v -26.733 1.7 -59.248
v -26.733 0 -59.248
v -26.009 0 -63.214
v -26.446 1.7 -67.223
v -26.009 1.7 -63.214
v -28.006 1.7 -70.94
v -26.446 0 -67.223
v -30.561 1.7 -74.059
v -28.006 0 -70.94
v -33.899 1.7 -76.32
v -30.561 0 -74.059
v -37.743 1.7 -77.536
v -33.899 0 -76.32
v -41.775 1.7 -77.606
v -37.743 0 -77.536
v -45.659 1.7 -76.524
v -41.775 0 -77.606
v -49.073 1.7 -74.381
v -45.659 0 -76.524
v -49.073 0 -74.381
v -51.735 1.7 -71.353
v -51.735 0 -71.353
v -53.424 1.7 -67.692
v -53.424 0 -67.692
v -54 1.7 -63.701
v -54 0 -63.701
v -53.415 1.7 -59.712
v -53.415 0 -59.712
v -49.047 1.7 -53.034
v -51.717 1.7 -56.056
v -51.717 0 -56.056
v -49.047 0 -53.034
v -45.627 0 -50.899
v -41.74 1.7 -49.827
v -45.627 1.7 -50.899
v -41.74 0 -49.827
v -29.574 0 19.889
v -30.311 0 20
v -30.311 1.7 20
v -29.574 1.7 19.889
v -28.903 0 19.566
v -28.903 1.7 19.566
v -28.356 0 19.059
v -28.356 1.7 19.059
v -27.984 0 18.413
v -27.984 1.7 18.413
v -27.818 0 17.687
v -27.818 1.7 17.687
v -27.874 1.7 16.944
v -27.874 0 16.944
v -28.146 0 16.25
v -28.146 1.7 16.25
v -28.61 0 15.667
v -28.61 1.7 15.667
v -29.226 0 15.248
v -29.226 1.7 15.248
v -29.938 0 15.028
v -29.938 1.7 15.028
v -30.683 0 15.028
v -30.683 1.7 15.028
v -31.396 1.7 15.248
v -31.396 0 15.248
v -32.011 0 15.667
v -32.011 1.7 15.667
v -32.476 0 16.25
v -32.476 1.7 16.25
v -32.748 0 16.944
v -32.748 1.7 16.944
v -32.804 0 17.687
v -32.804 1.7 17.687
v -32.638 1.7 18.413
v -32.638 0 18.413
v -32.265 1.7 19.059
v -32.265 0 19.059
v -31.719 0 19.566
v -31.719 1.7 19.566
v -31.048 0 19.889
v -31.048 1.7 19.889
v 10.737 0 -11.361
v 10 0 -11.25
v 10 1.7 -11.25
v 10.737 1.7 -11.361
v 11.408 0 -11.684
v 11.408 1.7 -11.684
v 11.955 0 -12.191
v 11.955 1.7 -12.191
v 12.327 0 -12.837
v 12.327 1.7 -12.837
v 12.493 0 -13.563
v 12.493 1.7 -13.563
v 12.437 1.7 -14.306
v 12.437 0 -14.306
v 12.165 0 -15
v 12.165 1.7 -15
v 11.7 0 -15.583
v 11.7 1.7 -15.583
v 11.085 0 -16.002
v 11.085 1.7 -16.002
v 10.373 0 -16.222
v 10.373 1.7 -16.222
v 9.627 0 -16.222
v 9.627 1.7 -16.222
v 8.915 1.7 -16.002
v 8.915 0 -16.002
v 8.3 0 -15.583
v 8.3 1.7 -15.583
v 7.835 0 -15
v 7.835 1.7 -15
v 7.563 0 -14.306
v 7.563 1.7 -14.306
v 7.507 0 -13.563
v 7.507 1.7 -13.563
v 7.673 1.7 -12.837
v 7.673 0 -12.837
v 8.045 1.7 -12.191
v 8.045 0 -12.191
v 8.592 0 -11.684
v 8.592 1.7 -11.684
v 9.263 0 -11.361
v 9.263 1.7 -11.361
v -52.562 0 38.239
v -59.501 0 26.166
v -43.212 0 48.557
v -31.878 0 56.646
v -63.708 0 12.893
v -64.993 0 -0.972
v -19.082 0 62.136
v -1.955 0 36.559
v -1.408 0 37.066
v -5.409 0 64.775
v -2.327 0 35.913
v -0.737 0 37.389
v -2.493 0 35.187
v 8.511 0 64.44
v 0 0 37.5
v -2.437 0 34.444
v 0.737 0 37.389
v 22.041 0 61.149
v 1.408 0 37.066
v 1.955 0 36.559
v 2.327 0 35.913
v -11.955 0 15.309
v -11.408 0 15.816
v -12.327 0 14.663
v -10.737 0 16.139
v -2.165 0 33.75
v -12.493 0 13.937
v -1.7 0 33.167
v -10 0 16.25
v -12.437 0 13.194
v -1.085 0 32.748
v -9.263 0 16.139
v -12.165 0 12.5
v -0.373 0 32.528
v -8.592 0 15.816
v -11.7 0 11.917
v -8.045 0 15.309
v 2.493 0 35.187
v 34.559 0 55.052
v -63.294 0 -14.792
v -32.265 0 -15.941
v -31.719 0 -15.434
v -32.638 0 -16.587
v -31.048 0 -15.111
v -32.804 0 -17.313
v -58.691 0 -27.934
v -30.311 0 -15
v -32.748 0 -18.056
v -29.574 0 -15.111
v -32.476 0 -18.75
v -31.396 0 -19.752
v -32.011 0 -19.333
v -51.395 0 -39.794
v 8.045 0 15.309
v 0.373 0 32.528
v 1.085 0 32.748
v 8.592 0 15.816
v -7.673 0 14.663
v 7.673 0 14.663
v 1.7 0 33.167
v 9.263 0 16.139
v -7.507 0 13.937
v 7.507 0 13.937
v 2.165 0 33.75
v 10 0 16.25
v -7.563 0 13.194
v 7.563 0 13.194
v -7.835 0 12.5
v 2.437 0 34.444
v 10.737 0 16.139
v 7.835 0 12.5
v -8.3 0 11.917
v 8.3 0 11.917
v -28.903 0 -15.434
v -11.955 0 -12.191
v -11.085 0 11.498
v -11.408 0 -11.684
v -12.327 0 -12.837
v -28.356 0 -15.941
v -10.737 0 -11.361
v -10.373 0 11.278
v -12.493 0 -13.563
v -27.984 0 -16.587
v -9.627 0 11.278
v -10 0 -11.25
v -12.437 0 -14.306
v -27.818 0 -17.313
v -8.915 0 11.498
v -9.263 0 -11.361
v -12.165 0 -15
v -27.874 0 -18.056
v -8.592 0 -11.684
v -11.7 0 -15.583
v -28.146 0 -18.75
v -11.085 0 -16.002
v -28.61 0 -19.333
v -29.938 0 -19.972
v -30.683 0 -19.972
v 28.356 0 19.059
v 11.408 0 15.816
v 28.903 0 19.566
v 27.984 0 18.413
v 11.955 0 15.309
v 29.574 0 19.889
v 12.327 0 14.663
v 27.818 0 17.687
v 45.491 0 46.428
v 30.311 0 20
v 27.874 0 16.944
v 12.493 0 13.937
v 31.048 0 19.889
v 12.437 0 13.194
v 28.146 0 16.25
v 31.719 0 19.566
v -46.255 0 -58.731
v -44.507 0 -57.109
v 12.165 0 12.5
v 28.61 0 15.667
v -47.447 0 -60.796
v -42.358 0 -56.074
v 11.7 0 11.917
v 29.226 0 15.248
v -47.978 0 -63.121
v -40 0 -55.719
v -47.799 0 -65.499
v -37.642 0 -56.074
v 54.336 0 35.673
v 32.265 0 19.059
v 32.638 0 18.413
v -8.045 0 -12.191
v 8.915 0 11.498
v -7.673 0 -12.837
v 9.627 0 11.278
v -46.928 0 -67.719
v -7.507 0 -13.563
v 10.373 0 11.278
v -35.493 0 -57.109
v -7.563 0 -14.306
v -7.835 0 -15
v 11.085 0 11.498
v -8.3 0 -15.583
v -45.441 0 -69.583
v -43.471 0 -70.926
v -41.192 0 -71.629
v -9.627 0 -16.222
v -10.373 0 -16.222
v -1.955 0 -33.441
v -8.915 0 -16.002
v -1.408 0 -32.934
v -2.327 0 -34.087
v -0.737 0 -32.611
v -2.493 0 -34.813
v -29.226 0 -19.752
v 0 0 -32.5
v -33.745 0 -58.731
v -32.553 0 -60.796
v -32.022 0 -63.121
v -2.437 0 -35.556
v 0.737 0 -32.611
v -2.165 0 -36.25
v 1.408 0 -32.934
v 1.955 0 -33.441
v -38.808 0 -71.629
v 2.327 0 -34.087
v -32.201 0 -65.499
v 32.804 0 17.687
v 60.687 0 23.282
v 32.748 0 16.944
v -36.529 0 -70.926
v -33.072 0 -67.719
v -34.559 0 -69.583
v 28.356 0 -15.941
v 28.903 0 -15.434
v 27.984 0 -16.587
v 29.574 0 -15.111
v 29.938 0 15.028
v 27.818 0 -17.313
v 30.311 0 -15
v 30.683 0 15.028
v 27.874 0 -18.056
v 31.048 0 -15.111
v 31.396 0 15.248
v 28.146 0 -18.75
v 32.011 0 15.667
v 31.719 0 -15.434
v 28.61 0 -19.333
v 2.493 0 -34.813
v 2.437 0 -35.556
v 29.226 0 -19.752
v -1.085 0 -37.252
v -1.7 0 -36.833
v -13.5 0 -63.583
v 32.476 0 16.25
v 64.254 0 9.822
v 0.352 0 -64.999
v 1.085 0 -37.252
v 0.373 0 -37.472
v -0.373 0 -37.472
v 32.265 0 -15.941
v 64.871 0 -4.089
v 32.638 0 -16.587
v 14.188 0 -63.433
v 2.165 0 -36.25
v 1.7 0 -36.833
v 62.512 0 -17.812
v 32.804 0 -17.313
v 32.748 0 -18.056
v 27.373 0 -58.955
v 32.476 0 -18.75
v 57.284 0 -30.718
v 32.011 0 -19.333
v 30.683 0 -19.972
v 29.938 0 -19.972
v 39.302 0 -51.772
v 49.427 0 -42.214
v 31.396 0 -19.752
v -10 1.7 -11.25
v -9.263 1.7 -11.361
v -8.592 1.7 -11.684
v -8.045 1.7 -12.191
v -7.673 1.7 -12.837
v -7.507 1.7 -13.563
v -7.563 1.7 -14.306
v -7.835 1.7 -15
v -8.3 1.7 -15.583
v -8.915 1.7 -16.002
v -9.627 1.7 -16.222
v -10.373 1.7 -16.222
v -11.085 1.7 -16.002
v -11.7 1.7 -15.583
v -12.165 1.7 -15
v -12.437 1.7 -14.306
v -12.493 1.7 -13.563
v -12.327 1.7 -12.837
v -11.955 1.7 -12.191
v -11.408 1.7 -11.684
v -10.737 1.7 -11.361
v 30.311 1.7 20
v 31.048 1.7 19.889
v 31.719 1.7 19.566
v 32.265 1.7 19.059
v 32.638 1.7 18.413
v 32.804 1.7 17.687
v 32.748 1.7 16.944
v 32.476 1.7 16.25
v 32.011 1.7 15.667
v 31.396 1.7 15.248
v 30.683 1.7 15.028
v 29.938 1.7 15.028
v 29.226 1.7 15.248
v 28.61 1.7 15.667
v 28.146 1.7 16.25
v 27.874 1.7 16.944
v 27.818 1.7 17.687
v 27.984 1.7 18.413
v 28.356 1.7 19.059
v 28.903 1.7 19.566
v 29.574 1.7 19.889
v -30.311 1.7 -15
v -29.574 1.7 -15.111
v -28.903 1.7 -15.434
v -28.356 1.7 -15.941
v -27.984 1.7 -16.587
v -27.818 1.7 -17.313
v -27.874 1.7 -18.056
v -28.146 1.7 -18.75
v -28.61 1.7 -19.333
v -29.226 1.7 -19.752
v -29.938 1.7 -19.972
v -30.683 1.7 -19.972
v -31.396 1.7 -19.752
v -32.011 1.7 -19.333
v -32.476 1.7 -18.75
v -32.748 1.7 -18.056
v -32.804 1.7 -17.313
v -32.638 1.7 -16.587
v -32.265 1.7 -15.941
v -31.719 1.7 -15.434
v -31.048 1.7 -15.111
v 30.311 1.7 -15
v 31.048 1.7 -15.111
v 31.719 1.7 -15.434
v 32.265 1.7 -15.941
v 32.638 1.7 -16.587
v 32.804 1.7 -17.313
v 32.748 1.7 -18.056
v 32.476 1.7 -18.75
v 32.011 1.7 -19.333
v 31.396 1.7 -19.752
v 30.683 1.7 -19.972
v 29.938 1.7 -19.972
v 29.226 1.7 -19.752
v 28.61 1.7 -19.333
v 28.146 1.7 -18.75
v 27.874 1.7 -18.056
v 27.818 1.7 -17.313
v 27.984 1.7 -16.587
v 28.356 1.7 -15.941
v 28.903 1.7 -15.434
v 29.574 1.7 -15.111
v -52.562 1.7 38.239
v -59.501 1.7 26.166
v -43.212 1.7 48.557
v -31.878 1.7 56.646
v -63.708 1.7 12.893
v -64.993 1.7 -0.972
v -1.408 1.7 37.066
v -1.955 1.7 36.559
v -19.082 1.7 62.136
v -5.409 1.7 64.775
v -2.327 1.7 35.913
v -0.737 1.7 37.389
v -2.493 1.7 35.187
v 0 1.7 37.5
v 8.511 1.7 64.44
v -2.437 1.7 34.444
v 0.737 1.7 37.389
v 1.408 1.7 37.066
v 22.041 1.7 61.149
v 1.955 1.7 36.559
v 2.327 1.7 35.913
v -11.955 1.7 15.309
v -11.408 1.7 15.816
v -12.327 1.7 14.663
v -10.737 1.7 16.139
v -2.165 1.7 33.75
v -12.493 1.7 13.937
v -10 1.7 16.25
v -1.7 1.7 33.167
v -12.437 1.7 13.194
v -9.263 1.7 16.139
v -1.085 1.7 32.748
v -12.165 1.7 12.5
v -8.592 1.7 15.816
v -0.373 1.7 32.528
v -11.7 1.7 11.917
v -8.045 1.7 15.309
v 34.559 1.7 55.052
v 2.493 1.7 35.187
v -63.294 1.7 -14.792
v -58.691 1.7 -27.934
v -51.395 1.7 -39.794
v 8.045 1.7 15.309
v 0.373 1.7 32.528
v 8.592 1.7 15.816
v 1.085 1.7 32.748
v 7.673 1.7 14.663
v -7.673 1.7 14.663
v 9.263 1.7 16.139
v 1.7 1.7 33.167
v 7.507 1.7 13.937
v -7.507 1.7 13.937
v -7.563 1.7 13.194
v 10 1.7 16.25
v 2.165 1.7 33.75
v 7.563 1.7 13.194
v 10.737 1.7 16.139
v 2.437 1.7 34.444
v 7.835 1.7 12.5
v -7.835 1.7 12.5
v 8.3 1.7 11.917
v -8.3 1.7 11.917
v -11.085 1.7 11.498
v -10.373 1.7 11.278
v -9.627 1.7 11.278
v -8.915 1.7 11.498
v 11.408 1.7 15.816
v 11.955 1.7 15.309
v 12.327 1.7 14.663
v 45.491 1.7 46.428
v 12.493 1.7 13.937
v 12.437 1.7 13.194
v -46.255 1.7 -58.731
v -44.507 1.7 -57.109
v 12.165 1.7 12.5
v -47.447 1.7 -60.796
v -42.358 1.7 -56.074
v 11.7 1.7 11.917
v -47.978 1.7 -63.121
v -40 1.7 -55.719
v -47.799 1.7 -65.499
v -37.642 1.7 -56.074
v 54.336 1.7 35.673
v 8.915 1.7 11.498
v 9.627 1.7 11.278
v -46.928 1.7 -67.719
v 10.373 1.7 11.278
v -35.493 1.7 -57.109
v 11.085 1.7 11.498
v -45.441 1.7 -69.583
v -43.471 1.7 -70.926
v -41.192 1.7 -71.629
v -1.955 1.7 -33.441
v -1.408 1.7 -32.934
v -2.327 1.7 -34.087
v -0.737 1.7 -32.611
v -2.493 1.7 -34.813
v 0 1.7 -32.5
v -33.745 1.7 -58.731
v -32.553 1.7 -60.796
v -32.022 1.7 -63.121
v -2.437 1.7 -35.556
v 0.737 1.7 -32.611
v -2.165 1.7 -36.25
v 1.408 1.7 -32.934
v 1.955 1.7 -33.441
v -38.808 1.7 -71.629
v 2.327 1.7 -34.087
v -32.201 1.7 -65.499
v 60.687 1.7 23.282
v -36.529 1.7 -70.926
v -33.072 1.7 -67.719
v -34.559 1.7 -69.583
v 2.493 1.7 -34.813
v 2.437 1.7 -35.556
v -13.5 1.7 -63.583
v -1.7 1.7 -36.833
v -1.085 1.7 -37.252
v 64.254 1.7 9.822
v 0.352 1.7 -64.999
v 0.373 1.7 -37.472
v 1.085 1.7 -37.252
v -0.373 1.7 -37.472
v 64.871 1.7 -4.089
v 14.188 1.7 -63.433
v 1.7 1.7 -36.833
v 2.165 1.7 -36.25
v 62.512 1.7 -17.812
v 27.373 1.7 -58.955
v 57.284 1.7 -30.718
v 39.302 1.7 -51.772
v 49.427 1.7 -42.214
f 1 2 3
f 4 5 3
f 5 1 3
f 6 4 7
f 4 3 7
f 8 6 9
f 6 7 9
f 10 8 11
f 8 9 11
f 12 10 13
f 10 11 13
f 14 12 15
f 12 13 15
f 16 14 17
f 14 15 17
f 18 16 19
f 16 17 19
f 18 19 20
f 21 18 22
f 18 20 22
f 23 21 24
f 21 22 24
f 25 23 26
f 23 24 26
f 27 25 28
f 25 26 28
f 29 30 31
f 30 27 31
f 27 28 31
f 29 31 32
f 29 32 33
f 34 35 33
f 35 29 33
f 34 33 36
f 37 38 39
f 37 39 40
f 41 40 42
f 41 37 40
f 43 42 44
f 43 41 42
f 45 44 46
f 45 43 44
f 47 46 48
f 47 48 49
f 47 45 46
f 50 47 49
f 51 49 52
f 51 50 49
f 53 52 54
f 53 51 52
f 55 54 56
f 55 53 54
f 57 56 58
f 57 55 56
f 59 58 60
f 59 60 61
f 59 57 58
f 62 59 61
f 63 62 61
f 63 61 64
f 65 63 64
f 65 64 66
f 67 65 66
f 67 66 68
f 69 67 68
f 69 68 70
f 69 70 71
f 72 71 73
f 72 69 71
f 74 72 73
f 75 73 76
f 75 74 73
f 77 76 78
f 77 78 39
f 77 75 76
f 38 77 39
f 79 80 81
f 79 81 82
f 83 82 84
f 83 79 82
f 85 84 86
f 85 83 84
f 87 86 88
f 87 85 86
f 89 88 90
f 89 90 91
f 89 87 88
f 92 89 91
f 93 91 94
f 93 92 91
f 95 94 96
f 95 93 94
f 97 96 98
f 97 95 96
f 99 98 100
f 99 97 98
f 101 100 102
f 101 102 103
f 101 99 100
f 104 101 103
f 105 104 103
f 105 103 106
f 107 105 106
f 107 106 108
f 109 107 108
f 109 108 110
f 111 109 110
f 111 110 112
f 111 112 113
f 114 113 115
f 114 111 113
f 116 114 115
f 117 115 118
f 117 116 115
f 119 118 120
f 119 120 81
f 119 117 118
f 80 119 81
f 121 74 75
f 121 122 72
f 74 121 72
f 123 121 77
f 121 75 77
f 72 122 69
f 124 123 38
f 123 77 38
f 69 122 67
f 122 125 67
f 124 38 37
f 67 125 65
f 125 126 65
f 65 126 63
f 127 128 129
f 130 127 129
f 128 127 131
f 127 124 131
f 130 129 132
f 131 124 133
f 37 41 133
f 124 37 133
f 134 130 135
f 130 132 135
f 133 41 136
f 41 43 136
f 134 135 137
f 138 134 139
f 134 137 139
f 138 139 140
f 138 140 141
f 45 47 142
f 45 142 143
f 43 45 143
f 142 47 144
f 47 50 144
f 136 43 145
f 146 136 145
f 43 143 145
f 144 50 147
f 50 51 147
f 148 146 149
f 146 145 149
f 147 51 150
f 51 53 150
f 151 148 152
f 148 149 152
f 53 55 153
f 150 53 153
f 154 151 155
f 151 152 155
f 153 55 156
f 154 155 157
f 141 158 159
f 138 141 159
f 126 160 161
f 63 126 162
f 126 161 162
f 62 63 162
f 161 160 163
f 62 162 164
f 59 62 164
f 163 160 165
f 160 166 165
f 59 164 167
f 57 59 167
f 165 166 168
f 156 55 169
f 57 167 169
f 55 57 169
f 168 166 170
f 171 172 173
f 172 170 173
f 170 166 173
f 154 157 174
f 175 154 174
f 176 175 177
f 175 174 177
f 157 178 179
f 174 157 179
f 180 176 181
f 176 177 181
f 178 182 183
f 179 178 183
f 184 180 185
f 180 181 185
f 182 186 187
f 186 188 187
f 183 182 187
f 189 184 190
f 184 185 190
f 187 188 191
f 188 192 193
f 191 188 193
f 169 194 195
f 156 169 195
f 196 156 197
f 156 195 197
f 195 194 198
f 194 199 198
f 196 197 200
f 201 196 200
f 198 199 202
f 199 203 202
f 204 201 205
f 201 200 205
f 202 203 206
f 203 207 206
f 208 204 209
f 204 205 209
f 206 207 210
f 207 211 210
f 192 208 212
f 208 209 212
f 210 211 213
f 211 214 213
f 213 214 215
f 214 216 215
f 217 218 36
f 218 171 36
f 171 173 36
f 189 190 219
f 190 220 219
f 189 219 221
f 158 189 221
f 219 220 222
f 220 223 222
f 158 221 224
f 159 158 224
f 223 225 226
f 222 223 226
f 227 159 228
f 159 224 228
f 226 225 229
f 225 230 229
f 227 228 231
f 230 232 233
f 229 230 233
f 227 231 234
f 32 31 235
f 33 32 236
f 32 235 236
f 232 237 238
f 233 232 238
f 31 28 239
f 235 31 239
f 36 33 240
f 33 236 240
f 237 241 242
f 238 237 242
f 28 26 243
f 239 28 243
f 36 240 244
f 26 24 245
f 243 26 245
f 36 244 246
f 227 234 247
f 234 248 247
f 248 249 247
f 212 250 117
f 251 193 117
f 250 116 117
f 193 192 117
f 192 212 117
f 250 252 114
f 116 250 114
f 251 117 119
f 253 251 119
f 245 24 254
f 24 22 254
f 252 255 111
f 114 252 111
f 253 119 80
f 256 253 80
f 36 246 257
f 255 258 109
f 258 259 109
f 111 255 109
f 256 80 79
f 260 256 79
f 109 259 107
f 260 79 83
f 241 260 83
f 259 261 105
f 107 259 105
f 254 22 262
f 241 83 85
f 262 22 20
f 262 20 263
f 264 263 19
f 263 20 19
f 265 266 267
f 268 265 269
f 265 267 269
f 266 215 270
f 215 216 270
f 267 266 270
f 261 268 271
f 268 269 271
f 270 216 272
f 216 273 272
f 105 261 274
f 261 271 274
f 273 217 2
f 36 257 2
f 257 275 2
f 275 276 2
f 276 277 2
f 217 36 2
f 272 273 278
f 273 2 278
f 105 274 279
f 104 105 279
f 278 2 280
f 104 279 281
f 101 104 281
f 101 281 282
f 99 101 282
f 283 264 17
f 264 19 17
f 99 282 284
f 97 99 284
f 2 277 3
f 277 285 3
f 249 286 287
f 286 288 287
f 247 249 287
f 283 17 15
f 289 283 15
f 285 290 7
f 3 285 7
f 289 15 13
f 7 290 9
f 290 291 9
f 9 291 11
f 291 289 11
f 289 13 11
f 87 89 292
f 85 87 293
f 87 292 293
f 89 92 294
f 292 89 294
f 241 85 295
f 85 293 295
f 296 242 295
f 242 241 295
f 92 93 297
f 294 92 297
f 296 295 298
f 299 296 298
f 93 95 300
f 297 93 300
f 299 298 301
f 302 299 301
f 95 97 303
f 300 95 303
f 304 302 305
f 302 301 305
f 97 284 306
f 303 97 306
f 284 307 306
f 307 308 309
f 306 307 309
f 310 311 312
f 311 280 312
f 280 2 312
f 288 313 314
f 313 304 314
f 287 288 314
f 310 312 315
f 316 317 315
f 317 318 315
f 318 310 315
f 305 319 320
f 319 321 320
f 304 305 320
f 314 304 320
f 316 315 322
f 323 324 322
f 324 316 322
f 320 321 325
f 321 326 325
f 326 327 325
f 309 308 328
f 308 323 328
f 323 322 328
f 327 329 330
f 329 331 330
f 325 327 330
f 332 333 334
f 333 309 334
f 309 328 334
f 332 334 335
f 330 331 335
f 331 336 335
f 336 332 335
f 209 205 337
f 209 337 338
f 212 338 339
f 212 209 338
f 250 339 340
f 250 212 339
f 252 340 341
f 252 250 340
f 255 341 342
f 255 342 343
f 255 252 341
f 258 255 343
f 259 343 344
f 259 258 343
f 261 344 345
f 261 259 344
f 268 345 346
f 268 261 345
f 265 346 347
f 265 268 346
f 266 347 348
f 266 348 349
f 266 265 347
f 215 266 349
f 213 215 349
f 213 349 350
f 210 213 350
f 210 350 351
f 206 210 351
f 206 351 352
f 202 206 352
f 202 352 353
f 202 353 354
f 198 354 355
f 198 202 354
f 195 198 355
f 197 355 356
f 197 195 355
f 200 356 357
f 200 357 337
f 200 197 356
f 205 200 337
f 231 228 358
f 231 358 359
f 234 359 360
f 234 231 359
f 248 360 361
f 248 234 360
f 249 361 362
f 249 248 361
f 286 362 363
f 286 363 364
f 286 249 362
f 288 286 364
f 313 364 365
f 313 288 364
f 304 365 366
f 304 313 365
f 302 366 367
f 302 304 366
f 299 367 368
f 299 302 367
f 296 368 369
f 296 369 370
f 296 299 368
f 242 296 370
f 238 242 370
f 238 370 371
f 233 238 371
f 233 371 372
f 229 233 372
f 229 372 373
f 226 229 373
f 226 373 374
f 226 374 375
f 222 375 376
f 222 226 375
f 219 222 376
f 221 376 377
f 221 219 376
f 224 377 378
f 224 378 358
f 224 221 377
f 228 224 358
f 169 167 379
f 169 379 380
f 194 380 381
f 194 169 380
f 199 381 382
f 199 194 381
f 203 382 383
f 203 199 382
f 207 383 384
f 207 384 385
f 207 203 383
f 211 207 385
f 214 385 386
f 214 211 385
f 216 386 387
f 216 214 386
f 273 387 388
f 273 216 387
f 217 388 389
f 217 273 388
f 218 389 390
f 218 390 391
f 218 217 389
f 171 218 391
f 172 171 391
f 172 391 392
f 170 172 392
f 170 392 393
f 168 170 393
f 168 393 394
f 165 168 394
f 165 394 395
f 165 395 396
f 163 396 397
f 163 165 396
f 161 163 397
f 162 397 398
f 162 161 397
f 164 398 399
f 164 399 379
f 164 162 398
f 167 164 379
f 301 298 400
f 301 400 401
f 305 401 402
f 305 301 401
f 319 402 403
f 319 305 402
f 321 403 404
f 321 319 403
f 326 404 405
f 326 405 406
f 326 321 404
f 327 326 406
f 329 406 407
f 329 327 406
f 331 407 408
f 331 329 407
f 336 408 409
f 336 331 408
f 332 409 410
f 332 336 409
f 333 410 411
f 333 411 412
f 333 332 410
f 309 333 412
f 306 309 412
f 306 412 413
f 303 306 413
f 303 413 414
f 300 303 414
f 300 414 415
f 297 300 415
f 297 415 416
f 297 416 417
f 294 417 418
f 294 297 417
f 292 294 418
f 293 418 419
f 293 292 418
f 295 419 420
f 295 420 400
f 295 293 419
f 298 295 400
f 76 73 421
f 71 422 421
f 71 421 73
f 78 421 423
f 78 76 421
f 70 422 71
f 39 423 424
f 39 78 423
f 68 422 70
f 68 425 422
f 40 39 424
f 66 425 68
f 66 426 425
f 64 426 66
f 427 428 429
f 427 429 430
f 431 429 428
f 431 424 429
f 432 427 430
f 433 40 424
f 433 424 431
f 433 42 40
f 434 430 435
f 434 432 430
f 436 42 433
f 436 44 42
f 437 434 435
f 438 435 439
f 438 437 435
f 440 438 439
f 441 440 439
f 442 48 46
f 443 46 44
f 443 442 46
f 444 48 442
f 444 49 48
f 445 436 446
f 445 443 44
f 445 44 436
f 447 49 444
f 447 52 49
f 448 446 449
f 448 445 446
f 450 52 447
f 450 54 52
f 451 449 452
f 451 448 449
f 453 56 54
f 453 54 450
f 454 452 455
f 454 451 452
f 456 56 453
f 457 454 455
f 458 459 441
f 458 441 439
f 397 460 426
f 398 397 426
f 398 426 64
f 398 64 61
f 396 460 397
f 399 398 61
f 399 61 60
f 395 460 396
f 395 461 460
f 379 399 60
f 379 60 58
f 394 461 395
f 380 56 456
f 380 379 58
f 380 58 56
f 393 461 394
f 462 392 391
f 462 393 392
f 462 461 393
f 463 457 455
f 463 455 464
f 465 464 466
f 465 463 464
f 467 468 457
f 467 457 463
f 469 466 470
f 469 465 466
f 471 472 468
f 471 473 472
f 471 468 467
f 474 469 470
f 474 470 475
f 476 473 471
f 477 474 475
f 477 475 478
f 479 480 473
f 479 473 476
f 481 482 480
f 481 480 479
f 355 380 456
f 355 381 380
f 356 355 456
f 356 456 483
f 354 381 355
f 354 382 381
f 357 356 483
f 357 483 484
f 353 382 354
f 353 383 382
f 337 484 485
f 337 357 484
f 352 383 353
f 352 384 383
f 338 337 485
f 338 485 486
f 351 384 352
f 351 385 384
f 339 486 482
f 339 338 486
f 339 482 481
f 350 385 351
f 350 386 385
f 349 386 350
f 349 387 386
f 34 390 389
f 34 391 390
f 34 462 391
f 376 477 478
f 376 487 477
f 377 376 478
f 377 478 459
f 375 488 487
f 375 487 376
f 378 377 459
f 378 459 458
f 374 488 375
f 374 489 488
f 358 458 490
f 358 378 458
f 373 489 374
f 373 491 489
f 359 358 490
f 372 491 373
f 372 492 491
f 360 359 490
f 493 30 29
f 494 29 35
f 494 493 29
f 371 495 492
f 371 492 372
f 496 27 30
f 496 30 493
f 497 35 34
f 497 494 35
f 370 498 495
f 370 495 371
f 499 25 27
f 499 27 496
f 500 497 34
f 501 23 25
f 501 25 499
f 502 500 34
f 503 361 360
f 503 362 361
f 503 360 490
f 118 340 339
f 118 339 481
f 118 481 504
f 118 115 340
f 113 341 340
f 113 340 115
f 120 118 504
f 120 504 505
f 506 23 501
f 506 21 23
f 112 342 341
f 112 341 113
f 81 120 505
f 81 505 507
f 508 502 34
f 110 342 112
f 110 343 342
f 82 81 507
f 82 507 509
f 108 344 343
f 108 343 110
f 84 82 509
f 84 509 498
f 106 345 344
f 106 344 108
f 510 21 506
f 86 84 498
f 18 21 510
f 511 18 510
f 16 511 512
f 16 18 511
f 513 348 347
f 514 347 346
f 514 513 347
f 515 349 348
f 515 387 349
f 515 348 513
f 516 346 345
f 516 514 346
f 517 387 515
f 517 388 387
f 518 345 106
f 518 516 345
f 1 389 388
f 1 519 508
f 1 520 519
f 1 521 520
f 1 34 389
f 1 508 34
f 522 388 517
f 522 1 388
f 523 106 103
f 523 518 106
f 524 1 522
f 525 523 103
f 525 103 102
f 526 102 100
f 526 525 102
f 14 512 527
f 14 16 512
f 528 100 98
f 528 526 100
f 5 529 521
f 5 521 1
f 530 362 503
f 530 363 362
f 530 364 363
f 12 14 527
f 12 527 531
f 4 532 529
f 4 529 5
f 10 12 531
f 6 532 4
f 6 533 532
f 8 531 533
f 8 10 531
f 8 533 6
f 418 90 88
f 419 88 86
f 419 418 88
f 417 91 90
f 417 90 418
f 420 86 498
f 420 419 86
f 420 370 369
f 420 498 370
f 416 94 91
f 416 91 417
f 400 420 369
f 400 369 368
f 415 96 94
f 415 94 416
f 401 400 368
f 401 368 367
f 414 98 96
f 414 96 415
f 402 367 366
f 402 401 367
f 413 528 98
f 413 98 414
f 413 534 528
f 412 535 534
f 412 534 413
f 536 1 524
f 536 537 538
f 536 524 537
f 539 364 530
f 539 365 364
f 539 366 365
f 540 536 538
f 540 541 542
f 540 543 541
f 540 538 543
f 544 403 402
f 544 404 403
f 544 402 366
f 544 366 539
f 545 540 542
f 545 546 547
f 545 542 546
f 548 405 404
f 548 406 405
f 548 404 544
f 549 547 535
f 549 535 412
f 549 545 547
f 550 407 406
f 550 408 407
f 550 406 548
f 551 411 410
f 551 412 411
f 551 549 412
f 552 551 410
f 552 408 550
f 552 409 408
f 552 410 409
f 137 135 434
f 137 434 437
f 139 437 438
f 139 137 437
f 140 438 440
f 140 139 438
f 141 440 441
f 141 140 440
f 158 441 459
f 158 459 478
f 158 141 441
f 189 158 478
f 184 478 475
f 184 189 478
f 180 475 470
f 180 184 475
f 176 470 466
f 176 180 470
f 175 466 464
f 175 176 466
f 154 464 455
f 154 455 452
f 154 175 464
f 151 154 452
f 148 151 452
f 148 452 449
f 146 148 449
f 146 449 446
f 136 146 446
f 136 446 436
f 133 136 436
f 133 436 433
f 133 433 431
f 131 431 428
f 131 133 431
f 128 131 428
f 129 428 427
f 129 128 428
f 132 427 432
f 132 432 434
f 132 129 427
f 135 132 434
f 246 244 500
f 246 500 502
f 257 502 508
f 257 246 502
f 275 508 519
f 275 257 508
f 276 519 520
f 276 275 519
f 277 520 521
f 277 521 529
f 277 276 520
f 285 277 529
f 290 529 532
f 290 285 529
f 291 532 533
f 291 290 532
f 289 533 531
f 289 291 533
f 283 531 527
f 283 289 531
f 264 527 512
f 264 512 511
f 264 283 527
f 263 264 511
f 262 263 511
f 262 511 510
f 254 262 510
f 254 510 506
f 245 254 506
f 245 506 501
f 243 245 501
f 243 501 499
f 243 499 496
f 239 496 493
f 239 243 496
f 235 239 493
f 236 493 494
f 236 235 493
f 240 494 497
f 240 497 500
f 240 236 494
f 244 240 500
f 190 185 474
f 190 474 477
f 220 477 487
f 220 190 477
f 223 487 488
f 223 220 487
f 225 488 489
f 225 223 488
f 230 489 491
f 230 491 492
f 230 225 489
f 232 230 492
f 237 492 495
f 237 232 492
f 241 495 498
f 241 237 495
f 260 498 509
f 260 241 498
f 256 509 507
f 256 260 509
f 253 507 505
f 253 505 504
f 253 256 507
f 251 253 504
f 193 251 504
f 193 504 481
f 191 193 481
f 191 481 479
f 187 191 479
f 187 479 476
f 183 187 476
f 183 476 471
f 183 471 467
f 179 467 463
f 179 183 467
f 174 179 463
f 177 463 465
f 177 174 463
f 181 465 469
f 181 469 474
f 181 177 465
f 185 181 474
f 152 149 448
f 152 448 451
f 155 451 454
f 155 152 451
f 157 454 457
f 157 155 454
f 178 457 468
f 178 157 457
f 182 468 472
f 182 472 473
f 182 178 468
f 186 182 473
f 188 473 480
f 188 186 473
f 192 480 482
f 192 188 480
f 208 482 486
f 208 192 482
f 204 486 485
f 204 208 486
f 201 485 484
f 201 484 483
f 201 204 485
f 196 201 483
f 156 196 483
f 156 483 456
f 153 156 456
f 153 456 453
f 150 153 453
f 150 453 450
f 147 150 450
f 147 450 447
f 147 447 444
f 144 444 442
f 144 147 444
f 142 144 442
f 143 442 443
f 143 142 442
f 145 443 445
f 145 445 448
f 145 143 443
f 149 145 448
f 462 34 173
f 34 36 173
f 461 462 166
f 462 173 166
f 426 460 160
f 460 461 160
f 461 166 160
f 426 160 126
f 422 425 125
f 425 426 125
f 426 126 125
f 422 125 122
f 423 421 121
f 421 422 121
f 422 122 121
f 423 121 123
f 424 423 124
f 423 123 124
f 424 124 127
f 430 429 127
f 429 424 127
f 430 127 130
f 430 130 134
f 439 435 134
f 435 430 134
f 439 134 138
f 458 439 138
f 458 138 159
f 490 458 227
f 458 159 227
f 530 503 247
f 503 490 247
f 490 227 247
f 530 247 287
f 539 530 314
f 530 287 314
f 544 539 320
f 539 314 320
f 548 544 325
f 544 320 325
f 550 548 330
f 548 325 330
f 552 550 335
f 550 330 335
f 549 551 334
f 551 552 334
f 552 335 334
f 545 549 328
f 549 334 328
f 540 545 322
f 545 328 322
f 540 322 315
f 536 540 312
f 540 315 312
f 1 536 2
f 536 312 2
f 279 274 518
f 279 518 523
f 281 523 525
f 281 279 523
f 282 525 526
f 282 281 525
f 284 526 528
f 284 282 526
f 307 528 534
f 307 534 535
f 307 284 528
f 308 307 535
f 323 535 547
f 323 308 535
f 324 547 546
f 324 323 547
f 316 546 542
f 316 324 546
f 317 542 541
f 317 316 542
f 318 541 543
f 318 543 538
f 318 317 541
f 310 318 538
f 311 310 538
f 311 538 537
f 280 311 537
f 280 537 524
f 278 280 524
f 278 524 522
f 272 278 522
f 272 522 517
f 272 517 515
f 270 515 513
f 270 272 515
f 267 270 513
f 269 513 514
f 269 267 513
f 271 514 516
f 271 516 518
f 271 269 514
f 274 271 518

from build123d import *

# Parameters (mm, degrees)
SKETCH1_R           = 65
SKETCH1_R_2         = 2.5
SKETCH1_R_3         = 14
SKETCH1_R_4         = 8
BOSS_EXTRUDE1_DEPTH = 1.7


with BuildPart() as part:
    # Sketch1 → Boss-Extrude1 (new body)
    # profile 1 of 2: a face of its own
    with BuildSketch(Plane(origin=(0, 0, 0), x_dir=(1, 0, 0), z_dir=(0, 1, 0))):
        Circle(SKETCH1_R)
        with Locations(Location((-10, 13.75, 0), (0, 0, 270))):
            Circle(SKETCH1_R_2, mode=Mode.SUBTRACT)
        with Locations(Location((10, 13.75, 0), (0, 0, 270))):
            Circle(SKETCH1_R_2, mode=Mode.SUBTRACT)
        with Locations(Location((10, -13.75, 0), (0, 0, 270))):
            Circle(SKETCH1_R_2, mode=Mode.SUBTRACT)
        with Locations(Location((-10, -13.75, 0), (0, 0, 270))):
            Circle(SKETCH1_R_2, mode=Mode.SUBTRACT)
        with Locations(Location((0, 35, 0), (0, 0, 270))):
            Circle(SKETCH1_R_2, mode=Mode.SUBTRACT)
        with Locations(Location((30.310889132, 17.5, 0), (0, 0, 270))):
            Circle(SKETCH1_R_2, mode=Mode.SUBTRACT)
        with Locations(Location((30.310889132, -17.5, 0), (0, 0, 270))):
            Circle(SKETCH1_R_2, mode=Mode.SUBTRACT)
        with Locations(Location((0, -35, 0), (0, 0, 270))):
            Circle(SKETCH1_R_2, mode=Mode.SUBTRACT)
        with Locations(Location((-30.310889132, -17.5, 0), (0, 0, 270))):
            Circle(SKETCH1_R_2, mode=Mode.SUBTRACT)
        with Locations(Location((-30.310889132, 17.5, 0), (0, 0, 270))):
            Circle(SKETCH1_R_2, mode=Mode.SUBTRACT)
    # profile 2 of 2: a face of its own
    with BuildSketch(Plane(origin=(0, 0, 0), x_dir=(1, 0, 0), z_dir=(0, 1, 0))):
        with Locations((-40, 63.718686589)):
            Circle(SKETCH1_R_3)
        with Locations(Location((-40, 63.718686589, 0), (0, 0, 270))):
            Circle(SKETCH1_R_4, mode=Mode.SUBTRACT)
    extrude(amount=BOSS_EXTRUDE1_DEPTH)


solid = part.part
